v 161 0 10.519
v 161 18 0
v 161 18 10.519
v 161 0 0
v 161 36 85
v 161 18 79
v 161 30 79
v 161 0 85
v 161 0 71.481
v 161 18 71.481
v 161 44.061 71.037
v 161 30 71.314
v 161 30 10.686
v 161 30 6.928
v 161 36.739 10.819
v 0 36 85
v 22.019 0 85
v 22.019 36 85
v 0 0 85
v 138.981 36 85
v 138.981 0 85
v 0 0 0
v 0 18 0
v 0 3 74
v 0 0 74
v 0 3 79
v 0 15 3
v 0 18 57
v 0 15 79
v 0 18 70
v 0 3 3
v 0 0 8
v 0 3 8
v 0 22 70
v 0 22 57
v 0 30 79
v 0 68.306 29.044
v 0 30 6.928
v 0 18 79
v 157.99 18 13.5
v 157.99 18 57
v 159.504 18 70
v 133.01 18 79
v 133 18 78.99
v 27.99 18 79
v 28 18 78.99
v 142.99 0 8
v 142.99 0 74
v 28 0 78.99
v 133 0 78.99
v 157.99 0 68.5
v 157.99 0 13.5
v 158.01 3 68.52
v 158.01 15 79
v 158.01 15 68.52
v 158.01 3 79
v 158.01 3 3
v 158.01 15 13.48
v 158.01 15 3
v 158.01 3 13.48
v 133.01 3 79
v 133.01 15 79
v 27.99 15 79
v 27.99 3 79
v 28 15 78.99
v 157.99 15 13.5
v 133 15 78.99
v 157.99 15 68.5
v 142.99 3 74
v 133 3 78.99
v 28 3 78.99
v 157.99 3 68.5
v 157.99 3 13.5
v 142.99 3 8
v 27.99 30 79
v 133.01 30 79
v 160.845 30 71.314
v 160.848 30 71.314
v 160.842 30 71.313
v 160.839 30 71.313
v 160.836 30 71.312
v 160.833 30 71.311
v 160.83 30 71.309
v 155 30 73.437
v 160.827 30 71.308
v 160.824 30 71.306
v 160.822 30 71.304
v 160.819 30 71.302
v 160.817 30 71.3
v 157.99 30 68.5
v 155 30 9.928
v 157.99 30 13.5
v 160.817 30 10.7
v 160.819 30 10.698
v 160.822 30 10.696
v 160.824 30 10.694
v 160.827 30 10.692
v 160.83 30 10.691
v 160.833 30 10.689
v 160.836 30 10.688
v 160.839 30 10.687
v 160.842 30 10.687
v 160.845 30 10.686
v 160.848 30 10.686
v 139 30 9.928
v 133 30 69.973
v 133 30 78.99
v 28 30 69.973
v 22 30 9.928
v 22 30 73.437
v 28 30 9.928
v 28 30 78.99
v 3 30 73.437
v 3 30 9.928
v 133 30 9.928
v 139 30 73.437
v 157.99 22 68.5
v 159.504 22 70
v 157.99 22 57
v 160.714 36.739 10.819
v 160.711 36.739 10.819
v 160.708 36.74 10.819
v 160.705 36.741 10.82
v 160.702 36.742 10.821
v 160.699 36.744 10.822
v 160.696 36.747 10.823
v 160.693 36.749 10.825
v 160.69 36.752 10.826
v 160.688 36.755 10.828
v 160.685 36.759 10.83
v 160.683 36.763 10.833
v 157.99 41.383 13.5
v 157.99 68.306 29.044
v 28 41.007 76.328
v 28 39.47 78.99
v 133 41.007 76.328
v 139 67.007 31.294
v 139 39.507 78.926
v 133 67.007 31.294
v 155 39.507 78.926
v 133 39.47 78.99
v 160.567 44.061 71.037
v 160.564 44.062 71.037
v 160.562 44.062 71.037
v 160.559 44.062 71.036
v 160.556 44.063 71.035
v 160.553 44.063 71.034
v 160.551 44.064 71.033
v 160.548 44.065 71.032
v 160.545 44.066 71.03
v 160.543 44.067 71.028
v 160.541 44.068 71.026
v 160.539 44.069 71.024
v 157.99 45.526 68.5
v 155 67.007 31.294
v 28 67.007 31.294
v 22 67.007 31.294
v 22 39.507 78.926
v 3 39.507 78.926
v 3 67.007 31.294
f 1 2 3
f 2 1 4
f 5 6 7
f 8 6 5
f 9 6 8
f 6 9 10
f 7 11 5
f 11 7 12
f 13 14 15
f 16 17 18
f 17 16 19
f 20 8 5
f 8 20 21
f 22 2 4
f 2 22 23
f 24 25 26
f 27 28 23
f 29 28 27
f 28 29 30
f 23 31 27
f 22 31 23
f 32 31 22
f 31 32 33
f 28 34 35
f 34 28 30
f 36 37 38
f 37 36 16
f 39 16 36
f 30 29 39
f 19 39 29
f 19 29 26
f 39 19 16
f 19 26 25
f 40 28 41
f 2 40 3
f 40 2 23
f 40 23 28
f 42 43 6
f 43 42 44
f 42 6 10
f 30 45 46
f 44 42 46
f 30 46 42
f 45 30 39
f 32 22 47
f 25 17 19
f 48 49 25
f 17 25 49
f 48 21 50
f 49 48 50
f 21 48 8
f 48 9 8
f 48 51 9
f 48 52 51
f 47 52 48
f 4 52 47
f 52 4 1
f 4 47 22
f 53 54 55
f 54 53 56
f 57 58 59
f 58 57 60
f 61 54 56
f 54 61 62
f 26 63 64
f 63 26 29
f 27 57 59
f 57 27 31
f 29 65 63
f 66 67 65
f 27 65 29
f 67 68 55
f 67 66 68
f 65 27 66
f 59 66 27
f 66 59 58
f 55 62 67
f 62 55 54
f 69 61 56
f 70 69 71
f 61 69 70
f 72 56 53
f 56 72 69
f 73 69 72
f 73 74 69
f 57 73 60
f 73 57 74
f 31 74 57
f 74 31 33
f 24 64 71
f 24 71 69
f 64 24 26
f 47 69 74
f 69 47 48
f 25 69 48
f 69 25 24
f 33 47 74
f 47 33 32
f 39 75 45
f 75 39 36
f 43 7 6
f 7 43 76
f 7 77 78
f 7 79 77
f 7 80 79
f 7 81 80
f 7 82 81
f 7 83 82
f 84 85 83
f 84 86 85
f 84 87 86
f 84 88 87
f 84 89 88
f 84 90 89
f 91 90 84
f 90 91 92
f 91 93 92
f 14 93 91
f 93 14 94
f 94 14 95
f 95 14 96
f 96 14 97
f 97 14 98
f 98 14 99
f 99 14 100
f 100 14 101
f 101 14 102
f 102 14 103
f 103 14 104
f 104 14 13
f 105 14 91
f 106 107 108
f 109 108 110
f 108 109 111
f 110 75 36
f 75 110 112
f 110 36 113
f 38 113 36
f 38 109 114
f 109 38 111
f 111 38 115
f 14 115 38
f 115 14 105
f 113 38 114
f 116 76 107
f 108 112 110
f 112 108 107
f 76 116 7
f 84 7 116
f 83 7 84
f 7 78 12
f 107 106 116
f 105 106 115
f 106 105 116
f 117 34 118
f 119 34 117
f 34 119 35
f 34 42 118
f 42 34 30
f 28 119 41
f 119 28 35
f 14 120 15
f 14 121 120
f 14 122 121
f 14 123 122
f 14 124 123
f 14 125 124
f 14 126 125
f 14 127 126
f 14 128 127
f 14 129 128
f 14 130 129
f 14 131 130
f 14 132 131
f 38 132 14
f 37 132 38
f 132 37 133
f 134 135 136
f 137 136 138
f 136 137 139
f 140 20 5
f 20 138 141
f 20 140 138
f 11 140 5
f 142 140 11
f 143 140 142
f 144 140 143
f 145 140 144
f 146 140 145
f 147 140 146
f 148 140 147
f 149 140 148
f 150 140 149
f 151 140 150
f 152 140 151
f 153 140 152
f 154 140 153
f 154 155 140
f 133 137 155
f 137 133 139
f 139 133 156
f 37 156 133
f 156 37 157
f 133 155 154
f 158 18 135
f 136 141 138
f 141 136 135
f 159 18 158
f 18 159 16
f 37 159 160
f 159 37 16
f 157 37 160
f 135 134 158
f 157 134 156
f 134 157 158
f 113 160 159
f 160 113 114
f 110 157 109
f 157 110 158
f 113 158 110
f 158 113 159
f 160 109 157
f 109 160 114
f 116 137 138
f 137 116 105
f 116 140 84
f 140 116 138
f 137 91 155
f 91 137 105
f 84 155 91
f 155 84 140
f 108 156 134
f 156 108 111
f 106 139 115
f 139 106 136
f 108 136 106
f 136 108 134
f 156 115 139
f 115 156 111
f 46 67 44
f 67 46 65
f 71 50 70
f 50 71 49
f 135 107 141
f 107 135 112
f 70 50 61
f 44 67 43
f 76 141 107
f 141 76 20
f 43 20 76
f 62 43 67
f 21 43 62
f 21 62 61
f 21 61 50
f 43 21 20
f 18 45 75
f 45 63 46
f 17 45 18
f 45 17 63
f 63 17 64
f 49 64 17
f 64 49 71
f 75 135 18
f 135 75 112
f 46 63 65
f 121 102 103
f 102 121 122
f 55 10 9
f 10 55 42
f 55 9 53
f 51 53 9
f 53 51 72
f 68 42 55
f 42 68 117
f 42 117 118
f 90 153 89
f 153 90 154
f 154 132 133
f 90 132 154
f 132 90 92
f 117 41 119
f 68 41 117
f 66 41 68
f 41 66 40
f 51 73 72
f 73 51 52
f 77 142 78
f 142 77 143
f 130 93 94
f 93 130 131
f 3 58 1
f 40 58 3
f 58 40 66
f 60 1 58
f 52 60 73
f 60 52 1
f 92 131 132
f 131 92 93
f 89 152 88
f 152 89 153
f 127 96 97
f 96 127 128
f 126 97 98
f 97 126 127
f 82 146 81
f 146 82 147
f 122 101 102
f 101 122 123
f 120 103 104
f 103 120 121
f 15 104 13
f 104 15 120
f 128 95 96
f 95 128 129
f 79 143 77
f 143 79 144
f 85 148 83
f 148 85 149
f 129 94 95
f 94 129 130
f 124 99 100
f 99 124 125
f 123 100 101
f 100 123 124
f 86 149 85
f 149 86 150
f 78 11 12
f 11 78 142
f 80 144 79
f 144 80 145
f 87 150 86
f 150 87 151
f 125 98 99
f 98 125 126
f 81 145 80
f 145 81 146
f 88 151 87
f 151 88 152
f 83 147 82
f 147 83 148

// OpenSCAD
eps = 0.01;
$fn = 90;

// mobile parameters
m_x = 155;
m_y = 12;
m_z = 76;
// mobile corners
m_c = 5;
// mobile slat (CZ lista, rost)
m_sl = 5;
// mobile stripe
m_st = 10;

m_p = 25;
// cut size for repros and USB
m_ru = 55;

// support cut parameters
// notebook corner parameters
sc_cy = 4;
sc_cz = 9;
// display thickness
sc_dt = 8;
sc_sz = 22;

// general parameters
t = 3;
alpha = 60;


module support_box()
{
    mb_x = m_x + 2*t;
    mb_y = m_y + 2*t;
    mb_z = m_z + 3*t;
    
    difference()
    {
        union()
        {
            difference()
            {
                // main block
                cube([mb_x, mb_y, mb_z]);
                // mobile side cut
                translate([-eps,t,t]) cube([m_x+t+2*eps,m_y,m_z]);
                // cut for display
                translate([-eps,-eps,t+m_sl])
                    cube([m_x-m_c-m_st+t,m_y+t,m_z-2*m_sl]);
                
            }
        
        
            // support box
            translate([0, m_y+2*t, 0]) difference()
            {
                // main box
                cube([2*t+m_x, m_z+2*t, m_z+3*t]);
                // cutting display holes
                translate([-eps, sc_cy, -eps])
                    cube([2*t+m_x+2*eps, sc_dt, t+m_z+eps]);
                // cutting upper part for display holes
                translate([-eps, 0, t+m_z-sc_cz])
                    cube([2*t+m_x+2*eps, sc_cy+sc_dt, sc_cz]);
                // cutting lower part for diplay holes
                translate([-eps, 0, -eps])
                    cube([2*t+m_x+2*eps, sc_cy+sc_dt, t+m_z-sc_sz+eps]);
                
                // cutting skewed parts
                // lower cut
                cl = 4*t+2*m_z;
                translate([-eps, 0, 0]) rotate([-alpha,0,0])
                    cube([2*eps+2*t+m_x,cl,cl]);
                // upper cut
                translate([-eps, sc_cy+sc_dt+2*t, 3*t+m_z])
                    rotate([-alpha,0,0])
                        cube([2*eps+2*t+m_x,cl,cl]);
            }
        }
        
        
        // cut for buttons
        mc_y = mb_y+2*eps+m_x;
        translate([t+m_p,-eps,m_z+t-eps]) hull()
        {
            // main cut
            cube([m_x-2*m_p,mc_y,2*t+2*eps]);
            // skewed sides
            tmp_d = 0.1;
            #translate([-2*t,mc_y-eps,2*t+tmp_d])
                rotate([90,0,0]) cylinder(d=tmp_d, h=mc_y);
            translate([m_x-2*m_p+2*t,mc_y-eps,2*t+tmp_d])
                rotate([90,0,0]) cylinder(d=tmp_d, h=mc_y);
        }
        // cut for USB and repros
        translate([t+m_x-eps,-eps,t+(m_z-m_ru)/2])
        hull()
        {
            // main cut
            cube([t+2*eps,mc_y,m_ru]);
            // skewed sides
            tmp_d = 0.1;
            translate([tmp_d+t,mb_y+eps,-t])
                rotate([90,0,0]) cylinder(d=tmp_d, h=mc_y);
            translate([tmp_d+t,mb_y+eps,m_ru+t])
                rotate([90,0,0]) cylinder(d=tmp_d, h=mc_y);
        }
        
        // holes for lighter structure
        z_holes = 55;
        difference()
        {
            union()
            {
                translate([t,mb_y,t]) rotate([90-alpha,0,0])
                    cube([m_p-2*t,2*mb_x,z_holes]);
                translate([mb_x-m_p+t,mb_y,t]) rotate([90-alpha,0,0])
                    cube([m_p-3*t,2*mb_x,z_holes]);
                translate([t+m_p,mb_y,t]) rotate([90-alpha,0,0])
                    cube([mb_x-2*m_p-2*t,2*mb_x,z_holes-t]);
            }
            translate([0,sc_cy+sc_dt/2+mb_y-z_holes,0])
                cube([mb_x, z_holes, mb_z]);
            
        }
    }
}


support_box();
